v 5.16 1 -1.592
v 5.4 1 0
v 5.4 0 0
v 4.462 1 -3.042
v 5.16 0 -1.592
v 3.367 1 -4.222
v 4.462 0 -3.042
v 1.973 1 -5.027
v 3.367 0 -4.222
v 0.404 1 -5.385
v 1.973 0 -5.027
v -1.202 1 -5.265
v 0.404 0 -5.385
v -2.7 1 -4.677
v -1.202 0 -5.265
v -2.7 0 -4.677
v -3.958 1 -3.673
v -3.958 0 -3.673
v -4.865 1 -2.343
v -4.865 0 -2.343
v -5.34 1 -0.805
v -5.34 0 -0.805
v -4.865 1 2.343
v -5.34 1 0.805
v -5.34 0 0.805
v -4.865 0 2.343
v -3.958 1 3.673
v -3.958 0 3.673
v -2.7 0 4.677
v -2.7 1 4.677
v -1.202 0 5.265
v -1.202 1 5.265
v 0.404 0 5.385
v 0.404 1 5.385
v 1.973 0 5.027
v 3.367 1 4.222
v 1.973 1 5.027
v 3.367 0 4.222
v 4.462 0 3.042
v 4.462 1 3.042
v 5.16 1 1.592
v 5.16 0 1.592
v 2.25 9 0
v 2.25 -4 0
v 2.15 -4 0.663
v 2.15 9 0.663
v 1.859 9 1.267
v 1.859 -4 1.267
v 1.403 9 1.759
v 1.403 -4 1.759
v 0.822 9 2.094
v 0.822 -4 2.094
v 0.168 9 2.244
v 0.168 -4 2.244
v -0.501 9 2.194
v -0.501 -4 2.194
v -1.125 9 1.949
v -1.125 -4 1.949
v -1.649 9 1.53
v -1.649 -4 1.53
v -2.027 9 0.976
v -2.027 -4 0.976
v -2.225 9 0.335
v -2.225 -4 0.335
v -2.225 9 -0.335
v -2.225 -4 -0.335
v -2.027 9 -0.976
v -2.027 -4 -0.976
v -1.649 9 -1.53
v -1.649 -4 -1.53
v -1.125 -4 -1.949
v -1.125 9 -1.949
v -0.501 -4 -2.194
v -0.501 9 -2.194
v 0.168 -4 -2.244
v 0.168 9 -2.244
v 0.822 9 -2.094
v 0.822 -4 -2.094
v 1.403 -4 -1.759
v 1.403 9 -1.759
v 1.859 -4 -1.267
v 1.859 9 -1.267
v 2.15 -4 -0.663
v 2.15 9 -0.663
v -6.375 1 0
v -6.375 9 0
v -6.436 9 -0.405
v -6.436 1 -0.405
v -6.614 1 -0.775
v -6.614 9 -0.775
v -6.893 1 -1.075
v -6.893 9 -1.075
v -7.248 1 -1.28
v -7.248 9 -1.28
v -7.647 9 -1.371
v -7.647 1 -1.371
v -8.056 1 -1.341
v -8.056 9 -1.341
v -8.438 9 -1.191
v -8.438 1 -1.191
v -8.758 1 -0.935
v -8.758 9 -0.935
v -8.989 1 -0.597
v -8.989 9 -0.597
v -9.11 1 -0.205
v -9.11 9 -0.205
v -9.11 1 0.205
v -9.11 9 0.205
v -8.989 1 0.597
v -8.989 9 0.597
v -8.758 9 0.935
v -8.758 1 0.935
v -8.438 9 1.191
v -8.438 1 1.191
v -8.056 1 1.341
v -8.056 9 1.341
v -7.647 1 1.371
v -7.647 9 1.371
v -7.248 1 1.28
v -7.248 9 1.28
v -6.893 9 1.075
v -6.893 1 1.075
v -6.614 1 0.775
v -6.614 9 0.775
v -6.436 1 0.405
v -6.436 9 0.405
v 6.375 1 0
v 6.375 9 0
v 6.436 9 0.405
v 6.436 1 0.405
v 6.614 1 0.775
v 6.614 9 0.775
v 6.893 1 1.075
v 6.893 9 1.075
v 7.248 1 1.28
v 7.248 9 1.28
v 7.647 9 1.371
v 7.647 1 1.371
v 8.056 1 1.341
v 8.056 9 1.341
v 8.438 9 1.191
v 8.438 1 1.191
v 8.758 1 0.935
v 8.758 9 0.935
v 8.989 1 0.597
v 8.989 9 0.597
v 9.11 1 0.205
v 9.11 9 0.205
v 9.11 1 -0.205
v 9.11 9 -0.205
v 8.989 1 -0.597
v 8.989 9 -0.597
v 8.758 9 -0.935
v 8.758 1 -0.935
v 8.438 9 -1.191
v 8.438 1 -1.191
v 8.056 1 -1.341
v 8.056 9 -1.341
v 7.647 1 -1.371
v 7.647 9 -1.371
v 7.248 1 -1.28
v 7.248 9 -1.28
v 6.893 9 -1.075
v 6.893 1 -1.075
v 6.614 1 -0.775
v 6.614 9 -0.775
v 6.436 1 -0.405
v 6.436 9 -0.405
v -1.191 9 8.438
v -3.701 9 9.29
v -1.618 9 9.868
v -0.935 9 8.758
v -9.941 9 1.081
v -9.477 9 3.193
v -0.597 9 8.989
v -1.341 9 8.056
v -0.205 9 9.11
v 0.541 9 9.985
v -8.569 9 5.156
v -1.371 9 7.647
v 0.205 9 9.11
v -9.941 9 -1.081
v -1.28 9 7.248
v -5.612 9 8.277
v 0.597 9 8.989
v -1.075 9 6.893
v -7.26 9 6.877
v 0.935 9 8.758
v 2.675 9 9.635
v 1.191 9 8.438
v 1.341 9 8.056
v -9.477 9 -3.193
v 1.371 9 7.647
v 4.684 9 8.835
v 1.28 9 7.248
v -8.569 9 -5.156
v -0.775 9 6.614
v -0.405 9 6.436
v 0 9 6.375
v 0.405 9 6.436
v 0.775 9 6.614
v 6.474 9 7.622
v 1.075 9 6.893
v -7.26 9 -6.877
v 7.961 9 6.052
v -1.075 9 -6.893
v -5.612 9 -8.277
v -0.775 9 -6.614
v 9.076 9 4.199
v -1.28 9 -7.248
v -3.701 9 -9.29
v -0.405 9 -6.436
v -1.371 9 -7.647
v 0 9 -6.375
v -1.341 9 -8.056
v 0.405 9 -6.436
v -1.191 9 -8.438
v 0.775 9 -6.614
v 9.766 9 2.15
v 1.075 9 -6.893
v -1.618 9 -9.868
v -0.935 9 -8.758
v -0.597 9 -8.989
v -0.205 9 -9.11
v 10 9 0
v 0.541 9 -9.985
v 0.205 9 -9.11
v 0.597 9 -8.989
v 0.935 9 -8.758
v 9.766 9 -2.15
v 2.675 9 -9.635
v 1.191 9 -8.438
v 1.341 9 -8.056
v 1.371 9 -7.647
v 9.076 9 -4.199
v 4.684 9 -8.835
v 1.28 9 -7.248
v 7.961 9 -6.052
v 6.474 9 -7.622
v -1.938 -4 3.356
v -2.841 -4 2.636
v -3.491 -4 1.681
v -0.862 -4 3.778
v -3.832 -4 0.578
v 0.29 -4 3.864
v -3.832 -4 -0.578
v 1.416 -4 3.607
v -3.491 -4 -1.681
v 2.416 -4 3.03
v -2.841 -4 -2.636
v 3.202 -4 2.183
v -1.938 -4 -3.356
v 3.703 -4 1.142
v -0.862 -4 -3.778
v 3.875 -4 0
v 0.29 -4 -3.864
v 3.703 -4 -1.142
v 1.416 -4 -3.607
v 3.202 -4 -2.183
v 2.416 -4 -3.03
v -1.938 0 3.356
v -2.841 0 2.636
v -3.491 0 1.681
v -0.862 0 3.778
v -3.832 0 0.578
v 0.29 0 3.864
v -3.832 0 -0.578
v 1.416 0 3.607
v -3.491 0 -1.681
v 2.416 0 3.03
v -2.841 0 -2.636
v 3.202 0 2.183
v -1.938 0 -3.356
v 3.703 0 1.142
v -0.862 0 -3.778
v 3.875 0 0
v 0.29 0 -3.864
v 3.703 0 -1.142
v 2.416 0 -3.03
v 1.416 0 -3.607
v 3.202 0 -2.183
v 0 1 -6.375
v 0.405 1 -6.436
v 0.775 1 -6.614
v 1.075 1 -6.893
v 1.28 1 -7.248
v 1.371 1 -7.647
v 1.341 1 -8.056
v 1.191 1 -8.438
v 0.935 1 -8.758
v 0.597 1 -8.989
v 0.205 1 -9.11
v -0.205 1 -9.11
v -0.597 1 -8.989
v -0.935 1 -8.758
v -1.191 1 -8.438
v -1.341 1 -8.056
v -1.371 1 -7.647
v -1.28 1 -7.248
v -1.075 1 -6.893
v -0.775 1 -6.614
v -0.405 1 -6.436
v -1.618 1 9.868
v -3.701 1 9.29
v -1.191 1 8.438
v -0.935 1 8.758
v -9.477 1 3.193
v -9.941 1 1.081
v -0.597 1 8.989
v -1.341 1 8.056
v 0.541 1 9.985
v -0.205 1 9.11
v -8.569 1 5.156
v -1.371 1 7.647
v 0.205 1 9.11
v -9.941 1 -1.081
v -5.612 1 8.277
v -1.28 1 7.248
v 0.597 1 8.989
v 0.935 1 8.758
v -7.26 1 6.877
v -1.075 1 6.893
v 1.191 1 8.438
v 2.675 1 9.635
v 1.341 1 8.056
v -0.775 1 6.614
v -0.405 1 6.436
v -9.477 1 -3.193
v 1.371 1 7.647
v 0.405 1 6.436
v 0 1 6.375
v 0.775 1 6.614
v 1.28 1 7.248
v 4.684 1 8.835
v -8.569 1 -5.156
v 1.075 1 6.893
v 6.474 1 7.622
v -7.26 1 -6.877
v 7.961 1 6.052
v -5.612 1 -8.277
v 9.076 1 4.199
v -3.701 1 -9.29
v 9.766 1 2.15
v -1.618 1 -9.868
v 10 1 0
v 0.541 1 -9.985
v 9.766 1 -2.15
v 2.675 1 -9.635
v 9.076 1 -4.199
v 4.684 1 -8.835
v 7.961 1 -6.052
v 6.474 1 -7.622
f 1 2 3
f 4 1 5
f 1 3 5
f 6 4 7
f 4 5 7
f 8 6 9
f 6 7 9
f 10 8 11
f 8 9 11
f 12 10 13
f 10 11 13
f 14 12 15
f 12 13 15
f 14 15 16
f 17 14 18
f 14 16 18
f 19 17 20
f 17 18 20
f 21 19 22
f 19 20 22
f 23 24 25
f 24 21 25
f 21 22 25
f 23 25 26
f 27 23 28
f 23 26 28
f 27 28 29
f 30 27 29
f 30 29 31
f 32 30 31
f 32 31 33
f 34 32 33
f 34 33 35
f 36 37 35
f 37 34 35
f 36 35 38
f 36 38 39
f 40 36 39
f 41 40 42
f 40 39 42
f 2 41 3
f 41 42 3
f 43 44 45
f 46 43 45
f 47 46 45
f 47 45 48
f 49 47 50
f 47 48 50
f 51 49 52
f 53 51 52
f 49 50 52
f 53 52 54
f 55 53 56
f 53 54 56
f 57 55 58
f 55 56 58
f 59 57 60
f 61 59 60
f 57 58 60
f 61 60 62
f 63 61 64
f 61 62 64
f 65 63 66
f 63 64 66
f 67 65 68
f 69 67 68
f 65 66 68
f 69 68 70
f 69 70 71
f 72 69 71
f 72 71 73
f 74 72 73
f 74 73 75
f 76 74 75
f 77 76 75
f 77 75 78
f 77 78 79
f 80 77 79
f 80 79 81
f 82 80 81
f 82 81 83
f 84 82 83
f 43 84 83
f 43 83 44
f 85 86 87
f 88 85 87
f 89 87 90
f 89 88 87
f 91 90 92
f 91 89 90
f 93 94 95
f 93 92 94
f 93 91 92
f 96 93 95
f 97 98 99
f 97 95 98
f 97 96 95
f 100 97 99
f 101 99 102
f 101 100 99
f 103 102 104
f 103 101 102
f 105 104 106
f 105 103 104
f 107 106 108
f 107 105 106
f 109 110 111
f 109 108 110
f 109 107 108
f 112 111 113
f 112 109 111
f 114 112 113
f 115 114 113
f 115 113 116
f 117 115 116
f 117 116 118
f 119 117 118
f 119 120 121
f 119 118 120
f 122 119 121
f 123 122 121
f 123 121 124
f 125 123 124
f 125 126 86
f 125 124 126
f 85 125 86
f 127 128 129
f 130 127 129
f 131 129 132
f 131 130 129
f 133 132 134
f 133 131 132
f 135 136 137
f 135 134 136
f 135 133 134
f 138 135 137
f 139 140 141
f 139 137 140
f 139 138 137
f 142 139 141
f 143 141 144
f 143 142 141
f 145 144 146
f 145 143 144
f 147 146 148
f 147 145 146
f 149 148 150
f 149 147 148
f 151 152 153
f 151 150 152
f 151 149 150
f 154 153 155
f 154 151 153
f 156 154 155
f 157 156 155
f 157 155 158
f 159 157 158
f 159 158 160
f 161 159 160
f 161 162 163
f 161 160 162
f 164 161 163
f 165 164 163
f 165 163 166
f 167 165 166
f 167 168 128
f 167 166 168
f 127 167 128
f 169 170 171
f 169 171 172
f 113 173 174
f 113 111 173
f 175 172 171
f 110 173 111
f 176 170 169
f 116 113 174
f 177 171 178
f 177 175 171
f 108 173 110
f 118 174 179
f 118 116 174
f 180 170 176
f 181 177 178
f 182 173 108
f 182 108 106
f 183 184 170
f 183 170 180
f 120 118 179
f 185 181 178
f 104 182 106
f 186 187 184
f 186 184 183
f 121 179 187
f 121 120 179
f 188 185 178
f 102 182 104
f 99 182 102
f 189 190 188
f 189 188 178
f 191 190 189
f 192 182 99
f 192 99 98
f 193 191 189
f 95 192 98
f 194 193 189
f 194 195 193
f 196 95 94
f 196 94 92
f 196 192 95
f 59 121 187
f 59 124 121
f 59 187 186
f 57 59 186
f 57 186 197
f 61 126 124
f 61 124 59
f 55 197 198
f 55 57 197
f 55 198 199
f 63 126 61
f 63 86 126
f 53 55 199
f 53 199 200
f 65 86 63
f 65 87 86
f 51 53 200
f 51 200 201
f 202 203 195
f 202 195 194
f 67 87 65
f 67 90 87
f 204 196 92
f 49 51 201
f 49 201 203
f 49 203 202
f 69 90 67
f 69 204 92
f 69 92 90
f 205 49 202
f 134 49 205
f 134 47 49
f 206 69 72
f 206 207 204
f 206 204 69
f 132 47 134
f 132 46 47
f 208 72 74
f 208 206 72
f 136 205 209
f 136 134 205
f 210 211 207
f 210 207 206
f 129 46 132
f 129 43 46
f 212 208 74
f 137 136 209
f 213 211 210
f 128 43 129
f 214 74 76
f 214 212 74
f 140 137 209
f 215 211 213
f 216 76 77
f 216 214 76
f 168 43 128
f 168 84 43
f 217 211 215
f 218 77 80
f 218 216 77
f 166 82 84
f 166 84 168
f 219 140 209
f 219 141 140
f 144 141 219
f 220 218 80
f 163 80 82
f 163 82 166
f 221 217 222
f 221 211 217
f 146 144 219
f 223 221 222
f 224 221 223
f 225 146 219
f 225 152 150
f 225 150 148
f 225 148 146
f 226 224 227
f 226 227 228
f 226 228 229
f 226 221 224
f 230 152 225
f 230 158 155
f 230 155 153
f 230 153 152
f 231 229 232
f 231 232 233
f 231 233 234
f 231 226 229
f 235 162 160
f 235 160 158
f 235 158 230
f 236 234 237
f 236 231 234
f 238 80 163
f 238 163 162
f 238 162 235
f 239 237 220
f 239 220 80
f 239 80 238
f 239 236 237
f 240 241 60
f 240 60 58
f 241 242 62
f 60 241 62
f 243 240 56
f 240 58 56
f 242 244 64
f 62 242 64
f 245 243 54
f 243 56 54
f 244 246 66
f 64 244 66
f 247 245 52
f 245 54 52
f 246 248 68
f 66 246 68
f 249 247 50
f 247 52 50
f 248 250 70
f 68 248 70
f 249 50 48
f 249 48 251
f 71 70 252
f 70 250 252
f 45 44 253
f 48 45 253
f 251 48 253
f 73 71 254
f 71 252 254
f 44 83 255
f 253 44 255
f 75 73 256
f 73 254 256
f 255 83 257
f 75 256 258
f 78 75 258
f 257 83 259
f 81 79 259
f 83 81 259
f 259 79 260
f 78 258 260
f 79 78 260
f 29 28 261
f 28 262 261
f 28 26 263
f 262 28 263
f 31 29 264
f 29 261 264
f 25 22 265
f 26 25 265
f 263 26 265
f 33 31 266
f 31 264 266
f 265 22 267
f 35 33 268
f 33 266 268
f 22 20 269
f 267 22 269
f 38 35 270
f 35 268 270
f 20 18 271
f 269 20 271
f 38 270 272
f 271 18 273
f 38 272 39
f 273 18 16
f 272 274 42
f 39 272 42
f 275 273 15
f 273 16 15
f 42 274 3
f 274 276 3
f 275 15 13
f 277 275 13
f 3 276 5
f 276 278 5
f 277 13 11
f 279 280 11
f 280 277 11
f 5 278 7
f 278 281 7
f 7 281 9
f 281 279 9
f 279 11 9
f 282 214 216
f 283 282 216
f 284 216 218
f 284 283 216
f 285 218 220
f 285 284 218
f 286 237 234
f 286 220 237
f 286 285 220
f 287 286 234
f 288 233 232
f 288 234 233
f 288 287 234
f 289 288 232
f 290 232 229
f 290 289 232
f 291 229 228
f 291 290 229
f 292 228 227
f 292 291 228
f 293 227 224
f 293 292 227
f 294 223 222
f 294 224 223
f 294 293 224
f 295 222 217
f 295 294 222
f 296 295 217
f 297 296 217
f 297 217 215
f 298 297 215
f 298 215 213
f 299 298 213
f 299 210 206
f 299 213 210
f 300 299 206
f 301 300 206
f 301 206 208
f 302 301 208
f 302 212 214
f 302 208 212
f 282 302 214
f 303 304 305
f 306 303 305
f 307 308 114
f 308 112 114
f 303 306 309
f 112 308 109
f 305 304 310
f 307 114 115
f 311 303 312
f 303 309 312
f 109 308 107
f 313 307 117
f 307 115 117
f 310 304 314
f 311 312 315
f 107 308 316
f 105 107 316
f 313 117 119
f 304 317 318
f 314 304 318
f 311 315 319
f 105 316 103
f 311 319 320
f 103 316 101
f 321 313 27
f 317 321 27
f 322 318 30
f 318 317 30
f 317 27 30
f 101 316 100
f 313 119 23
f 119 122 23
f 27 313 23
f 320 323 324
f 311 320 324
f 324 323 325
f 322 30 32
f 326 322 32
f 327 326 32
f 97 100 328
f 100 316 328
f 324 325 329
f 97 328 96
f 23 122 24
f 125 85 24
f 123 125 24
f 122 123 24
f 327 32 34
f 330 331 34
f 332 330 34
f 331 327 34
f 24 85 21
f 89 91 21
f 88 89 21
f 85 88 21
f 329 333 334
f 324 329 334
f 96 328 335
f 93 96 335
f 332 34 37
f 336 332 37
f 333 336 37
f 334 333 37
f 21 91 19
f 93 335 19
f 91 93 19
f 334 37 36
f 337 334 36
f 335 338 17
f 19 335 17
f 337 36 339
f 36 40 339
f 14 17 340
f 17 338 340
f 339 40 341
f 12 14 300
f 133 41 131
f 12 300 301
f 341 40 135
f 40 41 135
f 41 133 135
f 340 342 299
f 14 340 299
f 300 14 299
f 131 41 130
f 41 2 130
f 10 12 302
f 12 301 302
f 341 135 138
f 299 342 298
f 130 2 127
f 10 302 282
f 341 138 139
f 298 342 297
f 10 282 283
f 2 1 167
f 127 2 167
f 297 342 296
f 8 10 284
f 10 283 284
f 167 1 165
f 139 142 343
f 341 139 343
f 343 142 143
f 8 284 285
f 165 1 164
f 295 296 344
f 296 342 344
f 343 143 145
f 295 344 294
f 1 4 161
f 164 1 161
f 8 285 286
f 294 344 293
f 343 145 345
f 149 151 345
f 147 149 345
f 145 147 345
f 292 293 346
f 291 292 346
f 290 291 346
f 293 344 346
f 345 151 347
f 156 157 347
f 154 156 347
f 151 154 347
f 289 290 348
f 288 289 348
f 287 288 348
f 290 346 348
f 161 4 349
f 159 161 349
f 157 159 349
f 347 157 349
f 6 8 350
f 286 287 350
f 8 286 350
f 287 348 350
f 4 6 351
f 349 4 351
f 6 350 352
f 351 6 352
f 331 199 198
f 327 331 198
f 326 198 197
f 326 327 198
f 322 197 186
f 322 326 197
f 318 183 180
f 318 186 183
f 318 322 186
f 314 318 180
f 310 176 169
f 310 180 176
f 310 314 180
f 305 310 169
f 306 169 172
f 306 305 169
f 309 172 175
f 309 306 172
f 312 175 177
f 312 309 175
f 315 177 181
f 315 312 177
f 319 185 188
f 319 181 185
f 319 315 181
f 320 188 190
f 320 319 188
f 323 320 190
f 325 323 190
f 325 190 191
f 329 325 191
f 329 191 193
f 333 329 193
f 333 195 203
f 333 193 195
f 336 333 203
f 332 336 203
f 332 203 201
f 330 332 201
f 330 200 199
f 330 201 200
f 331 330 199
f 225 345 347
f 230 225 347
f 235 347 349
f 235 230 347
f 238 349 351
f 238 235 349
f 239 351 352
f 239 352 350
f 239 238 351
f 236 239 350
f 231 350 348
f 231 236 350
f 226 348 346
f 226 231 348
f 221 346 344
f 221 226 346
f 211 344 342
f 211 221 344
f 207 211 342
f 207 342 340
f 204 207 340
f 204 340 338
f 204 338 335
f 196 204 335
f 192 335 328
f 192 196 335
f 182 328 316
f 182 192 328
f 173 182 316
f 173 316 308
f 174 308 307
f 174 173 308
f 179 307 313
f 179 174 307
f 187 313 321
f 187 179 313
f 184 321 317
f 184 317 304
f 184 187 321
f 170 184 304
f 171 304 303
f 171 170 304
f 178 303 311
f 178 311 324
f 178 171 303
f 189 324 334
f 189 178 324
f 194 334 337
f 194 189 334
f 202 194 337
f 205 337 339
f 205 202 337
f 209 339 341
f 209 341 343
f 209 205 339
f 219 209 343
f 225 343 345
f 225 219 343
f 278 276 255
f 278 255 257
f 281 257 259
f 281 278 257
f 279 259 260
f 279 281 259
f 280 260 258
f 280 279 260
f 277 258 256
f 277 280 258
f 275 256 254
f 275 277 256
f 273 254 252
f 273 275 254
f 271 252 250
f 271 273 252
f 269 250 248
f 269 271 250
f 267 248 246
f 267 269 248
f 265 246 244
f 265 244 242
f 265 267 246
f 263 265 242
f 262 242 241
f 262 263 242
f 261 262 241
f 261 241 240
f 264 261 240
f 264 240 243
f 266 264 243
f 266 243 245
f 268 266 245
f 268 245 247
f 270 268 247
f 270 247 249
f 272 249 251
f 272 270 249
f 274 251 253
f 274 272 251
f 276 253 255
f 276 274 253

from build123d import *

# Parameters (mm, degrees)
SKETCH1_R                = 3.875
BOSS_EXTRUDE1_DEPTH      = 9
BOSS_EXTRUDE1_DEPTH_BACK = 4
SKETCH2_R                = 5.4
BOSS_EXTRUDE2_DEPTH      = 9
SKETCH7_R                = 10
BOSS_EXTRUDE4_DEPTH      = 8
SKETCH8_R                = 2.25
CUT_EXTRUDE4_DEPTH       = 1
CUT_EXTRUDE4_DEPTH_BACK  = 14
CUT_EXTRUDE2_START       = -9
SKETCH3_R                = 1.375
CUT_EXTRUDE2_DEPTH       = 10
CIRPATTERN2_COUNT        = 4


with BuildPart() as part:
    # Sketch1 → Boss-Extrude1 (new body, two sides)
    with BuildSketch(Plane(origin=(0, 0, 0), x_dir=(1, 0, 0), z_dir=(0, 1, 0))) as boss_extrude1_sk:
        Circle(SKETCH1_R)
    extrude(amount=BOSS_EXTRUDE1_DEPTH)
    extrude(boss_extrude1_sk.sketch, amount=-BOSS_EXTRUDE1_DEPTH_BACK)

    # Sketch2 → Boss-Extrude2 (add)
    with BuildSketch(Plane(origin=(0, 0, 0), x_dir=(1, 0, 0), z_dir=(0, 1, 0))):
        Circle(SKETCH2_R)
    extrude(amount=BOSS_EXTRUDE2_DEPTH)

    # Sketch7 → Boss-Extrude4 (add)
    with BuildSketch(Plane(origin=(0, 9, 0), x_dir=(1, 0, 0), z_dir=(0, 1, 0))):
        Circle(SKETCH7_R)
    extrude(amount=-BOSS_EXTRUDE4_DEPTH)

    # Sketch8 → Cut-Extrude4 (cut, two sides)
    with BuildSketch(Plane.XZ.offset(4)) as cut_extrude4_sk:
        Circle(SKETCH8_R)
    extrude(amount=CUT_EXTRUDE4_DEPTH, mode=Mode.SUBTRACT)
    extrude(cut_extrude4_sk.sketch, amount=-CUT_EXTRUDE4_DEPTH_BACK, mode=Mode.SUBTRACT)

    # Sketch3 → Cut-Extrude2 (cut)
    with BuildSketch(Plane(origin=(0, 9, 0), x_dir=(1, 0, 0), z_dir=(0, 1, 0)).offset(CUT_EXTRUDE2_START)):
        with Locations((-7.75, 0)):
            Circle(SKETCH3_R)
    cut_extrude2 = extrude(amount=CUT_EXTRUDE2_DEPTH, mode=Mode.SUBTRACT)

    # CirPattern2: Cut-Extrude2 ×4 about axis
    cirpattern2_axis = Axis((0, 0, 0), (0, 1, 0))
    for i in range(1, CIRPATTERN2_COUNT):
        add(cut_extrude2.rotate(cirpattern2_axis, i * 360 / CIRPATTERN2_COUNT), mode=Mode.SUBTRACT)


solid = part.part
